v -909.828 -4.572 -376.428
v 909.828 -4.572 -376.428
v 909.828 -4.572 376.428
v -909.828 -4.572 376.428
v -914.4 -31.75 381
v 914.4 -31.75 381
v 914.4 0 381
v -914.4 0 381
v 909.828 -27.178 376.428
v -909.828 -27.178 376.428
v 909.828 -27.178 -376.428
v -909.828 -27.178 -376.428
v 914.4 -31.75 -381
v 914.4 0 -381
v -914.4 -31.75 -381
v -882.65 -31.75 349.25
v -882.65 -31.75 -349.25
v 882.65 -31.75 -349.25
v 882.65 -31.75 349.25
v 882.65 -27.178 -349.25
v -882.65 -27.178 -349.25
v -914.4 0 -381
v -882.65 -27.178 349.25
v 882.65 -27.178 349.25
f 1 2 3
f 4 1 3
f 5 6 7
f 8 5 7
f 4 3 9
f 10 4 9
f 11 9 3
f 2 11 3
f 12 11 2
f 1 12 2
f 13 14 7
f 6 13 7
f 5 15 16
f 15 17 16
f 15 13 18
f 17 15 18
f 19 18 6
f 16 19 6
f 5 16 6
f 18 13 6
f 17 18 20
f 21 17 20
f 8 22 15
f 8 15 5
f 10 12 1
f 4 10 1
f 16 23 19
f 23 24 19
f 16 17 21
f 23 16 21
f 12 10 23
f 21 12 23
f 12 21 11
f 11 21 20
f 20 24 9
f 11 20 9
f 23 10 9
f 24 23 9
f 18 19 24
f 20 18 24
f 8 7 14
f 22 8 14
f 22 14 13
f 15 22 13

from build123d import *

# Parameters (mm, degrees)
BOSS_EXTRUDE1_DEPTH = 914.4
BOSS_EXTRUDE2_DEPTH = 381


with BuildPart() as part:
    # Sketch1 → Boss-Extrude1 (new body, symmetric)
    with BuildSketch(Plane(origin=(0, 0, 0), x_dir=(0, 0, -1), z_dir=(1, 0, 0))):
        Polygon((-381, 0), (381, 0), (381, -31.75), (349.25, -31.75), (349.25, -27.178), (376.428, -27.178), (376.428, -4.572), (-376.428, -4.572), (-376.428, -27.178), (-349.25, -27.178), (-349.25, -31.75), (-381, -31.75), align=None)
    extrude(amount=BOSS_EXTRUDE1_DEPTH, both=True)

    # Sketch2 → Boss-Extrude2 (add, symmetric)
    with BuildSketch(Plane.XY):
        Polygon((-914.4, 0), (-914.4, -31.75), (-882.65, -31.75), (-882.65, -27.178), (-909.828, -27.178), (-909.828, 0), align=None)
        Polygon((909.828, 0), (914.4, 0), (914.4, -31.75), (882.65, -31.75), (882.65, -27.178), (909.828, -27.178), align=None)
    extrude(amount=BOSS_EXTRUDE2_DEPTH, both=True)


solid = part.part
